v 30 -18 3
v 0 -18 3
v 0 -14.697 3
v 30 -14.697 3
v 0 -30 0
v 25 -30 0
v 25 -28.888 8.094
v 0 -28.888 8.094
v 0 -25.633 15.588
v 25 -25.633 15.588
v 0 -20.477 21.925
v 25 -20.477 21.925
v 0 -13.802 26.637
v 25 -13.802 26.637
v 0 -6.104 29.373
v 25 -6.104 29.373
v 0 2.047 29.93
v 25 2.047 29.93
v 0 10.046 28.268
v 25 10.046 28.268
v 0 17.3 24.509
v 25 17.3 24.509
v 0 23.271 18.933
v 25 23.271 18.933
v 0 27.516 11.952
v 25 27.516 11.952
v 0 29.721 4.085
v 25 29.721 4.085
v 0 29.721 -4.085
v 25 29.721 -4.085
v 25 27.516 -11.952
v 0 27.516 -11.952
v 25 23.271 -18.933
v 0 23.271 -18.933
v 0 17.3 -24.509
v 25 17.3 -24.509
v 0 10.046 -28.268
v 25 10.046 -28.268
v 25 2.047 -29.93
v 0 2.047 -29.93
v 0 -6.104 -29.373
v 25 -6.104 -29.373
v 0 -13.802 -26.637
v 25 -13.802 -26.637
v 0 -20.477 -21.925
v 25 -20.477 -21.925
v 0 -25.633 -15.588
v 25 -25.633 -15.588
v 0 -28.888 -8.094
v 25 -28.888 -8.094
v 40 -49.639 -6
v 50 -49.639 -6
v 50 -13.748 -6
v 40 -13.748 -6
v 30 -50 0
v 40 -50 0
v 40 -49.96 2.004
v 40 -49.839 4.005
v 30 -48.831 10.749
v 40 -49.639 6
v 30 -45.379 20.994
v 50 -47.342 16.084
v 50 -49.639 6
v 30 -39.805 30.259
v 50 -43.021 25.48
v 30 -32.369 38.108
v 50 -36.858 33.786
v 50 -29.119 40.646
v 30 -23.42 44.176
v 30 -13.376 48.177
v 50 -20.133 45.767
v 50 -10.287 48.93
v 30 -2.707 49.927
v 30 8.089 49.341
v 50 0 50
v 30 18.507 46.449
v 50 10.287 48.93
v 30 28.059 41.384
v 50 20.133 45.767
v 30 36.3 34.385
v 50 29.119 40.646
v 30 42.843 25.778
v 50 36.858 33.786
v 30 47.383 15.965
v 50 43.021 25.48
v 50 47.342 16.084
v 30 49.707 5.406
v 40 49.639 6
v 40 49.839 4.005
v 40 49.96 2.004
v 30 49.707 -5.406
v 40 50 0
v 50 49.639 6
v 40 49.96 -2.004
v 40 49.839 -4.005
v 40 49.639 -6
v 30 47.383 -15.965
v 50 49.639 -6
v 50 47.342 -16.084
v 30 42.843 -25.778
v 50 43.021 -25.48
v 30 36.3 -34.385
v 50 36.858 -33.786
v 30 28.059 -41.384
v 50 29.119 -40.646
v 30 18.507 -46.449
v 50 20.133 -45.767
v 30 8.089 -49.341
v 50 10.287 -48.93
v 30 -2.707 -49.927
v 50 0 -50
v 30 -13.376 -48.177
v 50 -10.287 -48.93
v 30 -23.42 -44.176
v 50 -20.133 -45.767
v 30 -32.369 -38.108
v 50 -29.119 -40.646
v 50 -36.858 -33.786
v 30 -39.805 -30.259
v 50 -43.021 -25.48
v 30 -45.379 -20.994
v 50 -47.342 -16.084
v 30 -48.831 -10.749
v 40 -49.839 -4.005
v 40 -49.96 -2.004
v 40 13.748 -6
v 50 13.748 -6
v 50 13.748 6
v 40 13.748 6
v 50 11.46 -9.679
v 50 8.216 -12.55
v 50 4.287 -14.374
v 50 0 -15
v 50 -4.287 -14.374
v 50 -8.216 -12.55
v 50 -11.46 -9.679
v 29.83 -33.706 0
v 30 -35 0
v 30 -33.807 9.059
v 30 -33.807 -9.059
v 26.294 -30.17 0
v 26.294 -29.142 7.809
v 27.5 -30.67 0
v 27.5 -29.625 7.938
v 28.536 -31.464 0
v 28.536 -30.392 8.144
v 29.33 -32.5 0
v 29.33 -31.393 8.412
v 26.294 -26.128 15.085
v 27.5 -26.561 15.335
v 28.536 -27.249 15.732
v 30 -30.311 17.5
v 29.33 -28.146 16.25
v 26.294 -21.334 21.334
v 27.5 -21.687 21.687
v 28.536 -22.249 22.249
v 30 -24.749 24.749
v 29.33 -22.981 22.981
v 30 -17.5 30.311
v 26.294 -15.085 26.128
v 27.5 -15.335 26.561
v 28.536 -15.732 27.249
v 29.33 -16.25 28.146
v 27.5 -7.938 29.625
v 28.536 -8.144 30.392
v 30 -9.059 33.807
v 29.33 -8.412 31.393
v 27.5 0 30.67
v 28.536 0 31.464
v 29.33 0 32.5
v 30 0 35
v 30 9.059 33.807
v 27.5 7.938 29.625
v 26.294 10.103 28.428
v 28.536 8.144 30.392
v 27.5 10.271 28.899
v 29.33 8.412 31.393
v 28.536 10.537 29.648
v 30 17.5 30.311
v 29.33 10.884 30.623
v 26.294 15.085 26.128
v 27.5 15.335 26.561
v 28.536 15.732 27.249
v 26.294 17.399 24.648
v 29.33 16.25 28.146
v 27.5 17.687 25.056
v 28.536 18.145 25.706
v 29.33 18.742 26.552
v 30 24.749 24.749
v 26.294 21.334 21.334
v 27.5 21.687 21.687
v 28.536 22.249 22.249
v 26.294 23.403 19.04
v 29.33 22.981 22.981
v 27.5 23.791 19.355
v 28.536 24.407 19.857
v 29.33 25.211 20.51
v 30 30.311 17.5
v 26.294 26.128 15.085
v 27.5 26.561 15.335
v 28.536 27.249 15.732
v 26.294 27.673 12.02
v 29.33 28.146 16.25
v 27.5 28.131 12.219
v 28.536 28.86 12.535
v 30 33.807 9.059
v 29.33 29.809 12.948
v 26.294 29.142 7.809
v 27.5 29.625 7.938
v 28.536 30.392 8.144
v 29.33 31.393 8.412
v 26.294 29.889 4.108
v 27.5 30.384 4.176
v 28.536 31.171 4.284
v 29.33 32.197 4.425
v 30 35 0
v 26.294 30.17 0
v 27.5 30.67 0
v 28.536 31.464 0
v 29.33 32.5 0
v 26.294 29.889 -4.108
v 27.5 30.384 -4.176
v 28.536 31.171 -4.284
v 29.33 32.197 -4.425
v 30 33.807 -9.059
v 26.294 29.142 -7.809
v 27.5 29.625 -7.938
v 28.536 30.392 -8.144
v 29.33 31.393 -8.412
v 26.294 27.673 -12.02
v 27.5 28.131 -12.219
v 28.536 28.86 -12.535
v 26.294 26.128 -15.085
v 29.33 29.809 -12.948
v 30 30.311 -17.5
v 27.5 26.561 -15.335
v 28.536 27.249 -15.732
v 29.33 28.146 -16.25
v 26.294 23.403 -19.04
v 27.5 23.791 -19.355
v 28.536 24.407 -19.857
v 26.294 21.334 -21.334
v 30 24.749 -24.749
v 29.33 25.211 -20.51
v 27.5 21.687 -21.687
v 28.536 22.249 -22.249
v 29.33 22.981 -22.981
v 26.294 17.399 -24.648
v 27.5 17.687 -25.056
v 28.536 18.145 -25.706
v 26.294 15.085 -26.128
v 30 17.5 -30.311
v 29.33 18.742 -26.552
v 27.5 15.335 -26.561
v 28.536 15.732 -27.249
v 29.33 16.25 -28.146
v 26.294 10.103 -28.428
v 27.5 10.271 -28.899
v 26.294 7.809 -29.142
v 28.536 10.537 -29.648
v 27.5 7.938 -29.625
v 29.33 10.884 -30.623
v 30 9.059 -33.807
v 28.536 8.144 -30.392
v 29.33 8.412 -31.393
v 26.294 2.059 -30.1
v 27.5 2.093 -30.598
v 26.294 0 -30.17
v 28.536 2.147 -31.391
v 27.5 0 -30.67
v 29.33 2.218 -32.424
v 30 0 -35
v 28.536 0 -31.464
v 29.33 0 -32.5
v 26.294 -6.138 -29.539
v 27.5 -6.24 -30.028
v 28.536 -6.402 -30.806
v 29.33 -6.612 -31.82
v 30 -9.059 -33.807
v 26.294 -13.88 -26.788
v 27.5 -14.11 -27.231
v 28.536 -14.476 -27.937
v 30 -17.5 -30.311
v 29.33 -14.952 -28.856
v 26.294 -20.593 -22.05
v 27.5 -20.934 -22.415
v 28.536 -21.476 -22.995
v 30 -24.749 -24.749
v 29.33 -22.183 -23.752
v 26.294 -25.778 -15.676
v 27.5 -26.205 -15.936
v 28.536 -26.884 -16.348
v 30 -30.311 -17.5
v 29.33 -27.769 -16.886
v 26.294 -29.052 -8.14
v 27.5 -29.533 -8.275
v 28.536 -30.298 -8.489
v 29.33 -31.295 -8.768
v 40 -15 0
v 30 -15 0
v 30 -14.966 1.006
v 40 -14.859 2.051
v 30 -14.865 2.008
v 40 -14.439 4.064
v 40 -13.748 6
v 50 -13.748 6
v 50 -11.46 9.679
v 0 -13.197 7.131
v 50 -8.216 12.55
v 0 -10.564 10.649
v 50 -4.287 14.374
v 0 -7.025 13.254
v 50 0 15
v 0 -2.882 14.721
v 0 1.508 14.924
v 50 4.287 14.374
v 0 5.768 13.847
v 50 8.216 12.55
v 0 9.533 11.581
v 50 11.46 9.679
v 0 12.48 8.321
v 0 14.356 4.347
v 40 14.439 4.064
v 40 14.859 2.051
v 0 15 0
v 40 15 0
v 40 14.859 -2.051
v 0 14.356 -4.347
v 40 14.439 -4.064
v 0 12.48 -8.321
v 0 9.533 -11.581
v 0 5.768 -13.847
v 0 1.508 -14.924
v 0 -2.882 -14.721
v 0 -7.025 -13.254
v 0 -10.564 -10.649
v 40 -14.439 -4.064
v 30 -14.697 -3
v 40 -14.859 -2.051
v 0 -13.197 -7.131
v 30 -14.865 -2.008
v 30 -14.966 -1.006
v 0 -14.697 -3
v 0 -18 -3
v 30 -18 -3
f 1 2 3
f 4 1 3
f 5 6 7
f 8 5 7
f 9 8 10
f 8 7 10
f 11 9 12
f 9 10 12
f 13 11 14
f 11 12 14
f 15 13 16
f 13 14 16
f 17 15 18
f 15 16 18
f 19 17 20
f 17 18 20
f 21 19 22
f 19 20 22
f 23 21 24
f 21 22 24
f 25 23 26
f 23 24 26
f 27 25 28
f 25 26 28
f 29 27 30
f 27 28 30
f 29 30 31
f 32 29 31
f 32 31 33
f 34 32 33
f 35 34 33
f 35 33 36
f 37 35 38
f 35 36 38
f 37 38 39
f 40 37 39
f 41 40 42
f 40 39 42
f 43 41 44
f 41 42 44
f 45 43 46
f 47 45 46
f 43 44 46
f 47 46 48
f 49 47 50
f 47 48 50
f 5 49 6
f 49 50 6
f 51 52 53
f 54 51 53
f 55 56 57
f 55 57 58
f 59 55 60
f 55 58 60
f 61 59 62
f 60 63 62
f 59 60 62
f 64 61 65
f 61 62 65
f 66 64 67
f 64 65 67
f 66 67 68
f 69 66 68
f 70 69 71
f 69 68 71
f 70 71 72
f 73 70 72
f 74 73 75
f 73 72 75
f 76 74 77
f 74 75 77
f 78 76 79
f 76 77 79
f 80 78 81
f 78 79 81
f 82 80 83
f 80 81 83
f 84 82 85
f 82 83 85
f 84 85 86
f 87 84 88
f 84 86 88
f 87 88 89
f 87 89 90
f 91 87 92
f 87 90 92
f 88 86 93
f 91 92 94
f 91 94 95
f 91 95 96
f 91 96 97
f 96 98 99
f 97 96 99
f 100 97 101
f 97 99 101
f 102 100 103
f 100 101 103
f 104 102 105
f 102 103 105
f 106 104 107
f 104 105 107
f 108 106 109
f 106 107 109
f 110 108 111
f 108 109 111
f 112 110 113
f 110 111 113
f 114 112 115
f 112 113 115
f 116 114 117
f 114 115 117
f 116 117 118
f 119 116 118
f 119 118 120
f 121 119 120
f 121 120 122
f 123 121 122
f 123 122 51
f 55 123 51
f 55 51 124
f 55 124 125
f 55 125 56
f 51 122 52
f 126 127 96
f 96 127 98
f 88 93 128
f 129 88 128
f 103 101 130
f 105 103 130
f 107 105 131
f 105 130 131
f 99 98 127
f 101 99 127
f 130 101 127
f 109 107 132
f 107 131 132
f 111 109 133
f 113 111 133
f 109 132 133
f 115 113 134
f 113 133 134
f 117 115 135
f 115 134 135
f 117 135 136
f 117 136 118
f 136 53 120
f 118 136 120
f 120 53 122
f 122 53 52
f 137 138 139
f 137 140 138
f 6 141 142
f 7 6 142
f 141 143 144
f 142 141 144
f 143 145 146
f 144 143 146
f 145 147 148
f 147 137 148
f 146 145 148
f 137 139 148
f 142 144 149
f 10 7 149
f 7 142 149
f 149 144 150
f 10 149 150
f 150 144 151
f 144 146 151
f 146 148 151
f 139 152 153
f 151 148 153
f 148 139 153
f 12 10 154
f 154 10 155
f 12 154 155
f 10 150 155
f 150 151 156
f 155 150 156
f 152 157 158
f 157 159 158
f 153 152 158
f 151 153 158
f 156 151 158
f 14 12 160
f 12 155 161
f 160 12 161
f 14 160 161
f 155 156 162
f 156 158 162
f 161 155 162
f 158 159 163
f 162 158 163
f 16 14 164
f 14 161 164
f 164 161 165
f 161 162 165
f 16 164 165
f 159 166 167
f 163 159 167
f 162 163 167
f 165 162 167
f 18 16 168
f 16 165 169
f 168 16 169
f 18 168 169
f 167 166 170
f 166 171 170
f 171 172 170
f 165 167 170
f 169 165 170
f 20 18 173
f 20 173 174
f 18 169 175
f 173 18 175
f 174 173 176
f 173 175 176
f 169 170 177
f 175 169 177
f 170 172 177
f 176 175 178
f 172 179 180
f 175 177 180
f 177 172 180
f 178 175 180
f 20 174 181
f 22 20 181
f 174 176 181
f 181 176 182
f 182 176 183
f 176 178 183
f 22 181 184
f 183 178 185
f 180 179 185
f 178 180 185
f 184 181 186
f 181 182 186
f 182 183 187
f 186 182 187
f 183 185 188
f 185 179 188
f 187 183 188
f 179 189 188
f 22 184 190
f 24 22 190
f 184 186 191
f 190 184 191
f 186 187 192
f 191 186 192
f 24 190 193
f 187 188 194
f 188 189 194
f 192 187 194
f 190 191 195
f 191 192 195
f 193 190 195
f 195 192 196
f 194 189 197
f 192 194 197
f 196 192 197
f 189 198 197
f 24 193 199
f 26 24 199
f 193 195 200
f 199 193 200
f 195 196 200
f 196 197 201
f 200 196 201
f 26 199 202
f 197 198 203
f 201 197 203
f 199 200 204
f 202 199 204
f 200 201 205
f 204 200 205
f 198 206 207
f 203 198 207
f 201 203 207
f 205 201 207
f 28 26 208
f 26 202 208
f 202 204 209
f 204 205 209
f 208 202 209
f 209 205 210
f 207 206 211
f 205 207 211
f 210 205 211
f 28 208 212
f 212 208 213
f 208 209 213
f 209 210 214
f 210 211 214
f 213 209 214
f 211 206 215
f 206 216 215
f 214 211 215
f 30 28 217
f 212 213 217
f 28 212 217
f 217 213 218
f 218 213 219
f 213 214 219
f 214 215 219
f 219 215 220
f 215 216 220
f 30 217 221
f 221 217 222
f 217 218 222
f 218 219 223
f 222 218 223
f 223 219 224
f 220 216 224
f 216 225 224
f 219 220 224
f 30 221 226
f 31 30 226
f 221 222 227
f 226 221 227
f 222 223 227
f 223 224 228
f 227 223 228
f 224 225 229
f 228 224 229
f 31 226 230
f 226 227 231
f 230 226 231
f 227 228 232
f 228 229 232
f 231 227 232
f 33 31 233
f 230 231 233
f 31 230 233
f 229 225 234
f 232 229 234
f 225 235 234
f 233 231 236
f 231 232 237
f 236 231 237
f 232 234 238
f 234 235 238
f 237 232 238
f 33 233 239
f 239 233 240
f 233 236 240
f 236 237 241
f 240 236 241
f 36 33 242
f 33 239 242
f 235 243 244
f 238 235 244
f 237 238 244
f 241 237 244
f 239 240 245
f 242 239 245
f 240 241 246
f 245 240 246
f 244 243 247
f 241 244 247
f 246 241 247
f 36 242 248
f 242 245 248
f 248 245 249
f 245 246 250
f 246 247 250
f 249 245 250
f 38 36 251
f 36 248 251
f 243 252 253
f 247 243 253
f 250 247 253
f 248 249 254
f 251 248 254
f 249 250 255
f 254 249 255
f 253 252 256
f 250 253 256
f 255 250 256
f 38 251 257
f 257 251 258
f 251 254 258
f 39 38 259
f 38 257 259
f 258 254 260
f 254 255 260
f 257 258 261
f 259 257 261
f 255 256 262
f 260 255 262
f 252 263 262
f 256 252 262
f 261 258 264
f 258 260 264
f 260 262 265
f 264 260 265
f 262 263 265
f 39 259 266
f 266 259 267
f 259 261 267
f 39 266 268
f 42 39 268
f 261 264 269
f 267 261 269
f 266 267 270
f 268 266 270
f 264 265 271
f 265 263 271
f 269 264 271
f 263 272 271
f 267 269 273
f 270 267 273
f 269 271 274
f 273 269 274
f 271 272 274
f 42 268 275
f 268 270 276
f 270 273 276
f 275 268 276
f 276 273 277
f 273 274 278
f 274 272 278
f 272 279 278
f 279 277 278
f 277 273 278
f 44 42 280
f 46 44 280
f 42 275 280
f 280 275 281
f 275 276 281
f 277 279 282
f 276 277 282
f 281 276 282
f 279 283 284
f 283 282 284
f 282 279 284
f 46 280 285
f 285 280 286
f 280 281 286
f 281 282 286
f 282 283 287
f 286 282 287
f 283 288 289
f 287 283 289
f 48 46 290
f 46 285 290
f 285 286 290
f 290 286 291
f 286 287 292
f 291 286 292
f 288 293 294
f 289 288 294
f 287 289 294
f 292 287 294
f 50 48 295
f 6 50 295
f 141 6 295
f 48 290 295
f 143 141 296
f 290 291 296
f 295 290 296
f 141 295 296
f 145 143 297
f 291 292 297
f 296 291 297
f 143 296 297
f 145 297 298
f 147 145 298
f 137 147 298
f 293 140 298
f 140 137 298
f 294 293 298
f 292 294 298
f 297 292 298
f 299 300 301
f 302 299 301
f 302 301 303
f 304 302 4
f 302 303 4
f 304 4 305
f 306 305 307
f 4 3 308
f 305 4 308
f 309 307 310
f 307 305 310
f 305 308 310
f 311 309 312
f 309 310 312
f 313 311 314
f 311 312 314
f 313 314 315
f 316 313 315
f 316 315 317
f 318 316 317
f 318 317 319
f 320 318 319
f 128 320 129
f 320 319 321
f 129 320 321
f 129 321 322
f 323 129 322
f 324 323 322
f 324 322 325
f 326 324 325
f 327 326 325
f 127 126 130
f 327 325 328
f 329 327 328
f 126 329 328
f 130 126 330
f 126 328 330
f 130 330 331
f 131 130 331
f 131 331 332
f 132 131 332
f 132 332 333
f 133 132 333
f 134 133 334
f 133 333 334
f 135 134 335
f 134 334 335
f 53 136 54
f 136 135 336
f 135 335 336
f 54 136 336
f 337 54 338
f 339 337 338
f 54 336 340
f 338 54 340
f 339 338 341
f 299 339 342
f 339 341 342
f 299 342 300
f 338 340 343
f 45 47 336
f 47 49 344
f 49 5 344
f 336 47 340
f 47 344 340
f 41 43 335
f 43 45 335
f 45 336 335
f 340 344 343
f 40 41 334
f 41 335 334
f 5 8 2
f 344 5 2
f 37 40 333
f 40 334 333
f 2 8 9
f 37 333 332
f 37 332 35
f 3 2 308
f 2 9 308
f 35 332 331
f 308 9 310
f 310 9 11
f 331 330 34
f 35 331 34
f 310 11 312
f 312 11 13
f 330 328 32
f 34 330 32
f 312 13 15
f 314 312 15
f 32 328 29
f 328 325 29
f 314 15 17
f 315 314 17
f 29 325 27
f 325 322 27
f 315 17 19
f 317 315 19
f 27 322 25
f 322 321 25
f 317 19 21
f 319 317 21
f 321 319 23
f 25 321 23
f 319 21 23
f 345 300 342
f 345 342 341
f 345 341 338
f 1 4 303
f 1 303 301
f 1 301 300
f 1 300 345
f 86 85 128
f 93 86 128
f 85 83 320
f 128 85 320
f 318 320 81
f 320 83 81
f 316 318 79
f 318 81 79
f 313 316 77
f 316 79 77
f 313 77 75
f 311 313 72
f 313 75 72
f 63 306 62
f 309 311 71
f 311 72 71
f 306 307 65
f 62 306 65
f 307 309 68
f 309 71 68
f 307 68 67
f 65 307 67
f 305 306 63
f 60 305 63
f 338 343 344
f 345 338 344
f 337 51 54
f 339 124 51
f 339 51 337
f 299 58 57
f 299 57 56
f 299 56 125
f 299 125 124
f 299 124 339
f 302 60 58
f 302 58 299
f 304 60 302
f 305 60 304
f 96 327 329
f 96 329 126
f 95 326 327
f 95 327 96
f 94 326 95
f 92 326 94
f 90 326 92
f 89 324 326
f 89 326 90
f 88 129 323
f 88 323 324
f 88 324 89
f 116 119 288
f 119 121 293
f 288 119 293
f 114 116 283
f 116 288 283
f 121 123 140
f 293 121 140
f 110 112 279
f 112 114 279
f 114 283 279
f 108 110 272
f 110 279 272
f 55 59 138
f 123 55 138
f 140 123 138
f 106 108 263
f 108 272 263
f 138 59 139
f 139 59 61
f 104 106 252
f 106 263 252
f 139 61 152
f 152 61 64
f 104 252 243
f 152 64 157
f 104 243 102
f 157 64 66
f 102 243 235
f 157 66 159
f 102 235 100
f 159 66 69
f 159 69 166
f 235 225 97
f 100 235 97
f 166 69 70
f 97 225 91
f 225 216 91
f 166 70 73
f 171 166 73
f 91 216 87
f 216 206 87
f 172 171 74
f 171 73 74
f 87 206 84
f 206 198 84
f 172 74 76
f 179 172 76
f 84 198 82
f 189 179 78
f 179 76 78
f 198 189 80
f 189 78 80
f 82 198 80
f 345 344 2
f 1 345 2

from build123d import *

# Parameters (mm, degrees)
F2_R     = 15
F3_DEPTH = 50.001
F5_DEPTH = 30
F7_DEPTH = 10
F8_R     = 5


with BuildPart() as f1:
    # F0 (on Top) → F1 (revolve)
    with BuildSketch(Plane.XY):
        Polygon((40, 0), (0, 0), (0, -15), (50, -15), (50, -6), (40, -6), align=None)
        Polygon((50, -15), (0, -15), (0, -30), (30, -30), (30, -50), (50, -50), align=None)
    revolve(axis=Axis((20, 0, 0), (-1, 0, 0)))

    # F2 (on face) → F3 (cut, through all)
    with BuildSketch(Plane(origin=(0, 0, 0), x_dir=(0, -1, 0), z_dir=(-1, 0, 0))):
        Circle(F2_R)
    extrude(amount=-F3_DEPTH, mode=Mode.SUBTRACT)

    # F4 (on face) → F5 (cut, through all)
    with BuildSketch(Plane(origin=(0, 0, 0), x_dir=(0, -1, 0), z_dir=(-1, 0, 0))):
        with BuildLine():
            Line((14.6969384567, -3), (18, -3))
            Line((18, -3), (18, 3))
            Line((18, 3), (14.6969384567, 3))
            ThreePointArc((14.6969384567, 3), (14.9240422951, 1.5076344301), (15, 0))
            ThreePointArc((15, 0), (14.9240422951, -1.5076344301), (14.6969384567, -3))
        make_face()
    extrude(amount=-F5_DEPTH, mode=Mode.SUBTRACT)

    # F6 (on face) → F7 (cut)
    with BuildSketch(Plane.YZ.offset(50)):
        with BuildLine():
            ThreePointArc((-49.638694584, 6), (-50, 0), (-49.638694584, -6))
            Line((-49.638694584, -6), (-13.7477270849, -6))
            ThreePointArc((-13.7477270849, -6), (-15, 0), (-13.7477270849, 6))
            Line((-13.7477270849, 6), (-49.638694584, 6))
        make_face()
        with BuildLine():
            Line((13.7477270849, -6), (49.638694584, -6))
            ThreePointArc((49.638694584, -6), (49.9095919098, -3.0054343115), (50, 0))
            ThreePointArc((50, 0), (49.9095919098, 3.0054343115), (49.638694584, 6))
            Line((49.638694584, 6), (13.7477270849, 6))
            ThreePointArc((13.7477270849, 6), (14.683594694, 3.0646446553), (15, 0))
            ThreePointArc((15, 0), (14.683594694, -3.0646446553), (13.7477270849, -6))
        make_face()
    extrude(amount=-F7_DEPTH, mode=Mode.SUBTRACT)

    # F8
    f8_edges = [f1.edges().sort_by_distance(p)[0] for p in [
        (30, 30, 0),
    ]]
    fillet(f8_edges, radius=F8_R)


solid = f1.part
